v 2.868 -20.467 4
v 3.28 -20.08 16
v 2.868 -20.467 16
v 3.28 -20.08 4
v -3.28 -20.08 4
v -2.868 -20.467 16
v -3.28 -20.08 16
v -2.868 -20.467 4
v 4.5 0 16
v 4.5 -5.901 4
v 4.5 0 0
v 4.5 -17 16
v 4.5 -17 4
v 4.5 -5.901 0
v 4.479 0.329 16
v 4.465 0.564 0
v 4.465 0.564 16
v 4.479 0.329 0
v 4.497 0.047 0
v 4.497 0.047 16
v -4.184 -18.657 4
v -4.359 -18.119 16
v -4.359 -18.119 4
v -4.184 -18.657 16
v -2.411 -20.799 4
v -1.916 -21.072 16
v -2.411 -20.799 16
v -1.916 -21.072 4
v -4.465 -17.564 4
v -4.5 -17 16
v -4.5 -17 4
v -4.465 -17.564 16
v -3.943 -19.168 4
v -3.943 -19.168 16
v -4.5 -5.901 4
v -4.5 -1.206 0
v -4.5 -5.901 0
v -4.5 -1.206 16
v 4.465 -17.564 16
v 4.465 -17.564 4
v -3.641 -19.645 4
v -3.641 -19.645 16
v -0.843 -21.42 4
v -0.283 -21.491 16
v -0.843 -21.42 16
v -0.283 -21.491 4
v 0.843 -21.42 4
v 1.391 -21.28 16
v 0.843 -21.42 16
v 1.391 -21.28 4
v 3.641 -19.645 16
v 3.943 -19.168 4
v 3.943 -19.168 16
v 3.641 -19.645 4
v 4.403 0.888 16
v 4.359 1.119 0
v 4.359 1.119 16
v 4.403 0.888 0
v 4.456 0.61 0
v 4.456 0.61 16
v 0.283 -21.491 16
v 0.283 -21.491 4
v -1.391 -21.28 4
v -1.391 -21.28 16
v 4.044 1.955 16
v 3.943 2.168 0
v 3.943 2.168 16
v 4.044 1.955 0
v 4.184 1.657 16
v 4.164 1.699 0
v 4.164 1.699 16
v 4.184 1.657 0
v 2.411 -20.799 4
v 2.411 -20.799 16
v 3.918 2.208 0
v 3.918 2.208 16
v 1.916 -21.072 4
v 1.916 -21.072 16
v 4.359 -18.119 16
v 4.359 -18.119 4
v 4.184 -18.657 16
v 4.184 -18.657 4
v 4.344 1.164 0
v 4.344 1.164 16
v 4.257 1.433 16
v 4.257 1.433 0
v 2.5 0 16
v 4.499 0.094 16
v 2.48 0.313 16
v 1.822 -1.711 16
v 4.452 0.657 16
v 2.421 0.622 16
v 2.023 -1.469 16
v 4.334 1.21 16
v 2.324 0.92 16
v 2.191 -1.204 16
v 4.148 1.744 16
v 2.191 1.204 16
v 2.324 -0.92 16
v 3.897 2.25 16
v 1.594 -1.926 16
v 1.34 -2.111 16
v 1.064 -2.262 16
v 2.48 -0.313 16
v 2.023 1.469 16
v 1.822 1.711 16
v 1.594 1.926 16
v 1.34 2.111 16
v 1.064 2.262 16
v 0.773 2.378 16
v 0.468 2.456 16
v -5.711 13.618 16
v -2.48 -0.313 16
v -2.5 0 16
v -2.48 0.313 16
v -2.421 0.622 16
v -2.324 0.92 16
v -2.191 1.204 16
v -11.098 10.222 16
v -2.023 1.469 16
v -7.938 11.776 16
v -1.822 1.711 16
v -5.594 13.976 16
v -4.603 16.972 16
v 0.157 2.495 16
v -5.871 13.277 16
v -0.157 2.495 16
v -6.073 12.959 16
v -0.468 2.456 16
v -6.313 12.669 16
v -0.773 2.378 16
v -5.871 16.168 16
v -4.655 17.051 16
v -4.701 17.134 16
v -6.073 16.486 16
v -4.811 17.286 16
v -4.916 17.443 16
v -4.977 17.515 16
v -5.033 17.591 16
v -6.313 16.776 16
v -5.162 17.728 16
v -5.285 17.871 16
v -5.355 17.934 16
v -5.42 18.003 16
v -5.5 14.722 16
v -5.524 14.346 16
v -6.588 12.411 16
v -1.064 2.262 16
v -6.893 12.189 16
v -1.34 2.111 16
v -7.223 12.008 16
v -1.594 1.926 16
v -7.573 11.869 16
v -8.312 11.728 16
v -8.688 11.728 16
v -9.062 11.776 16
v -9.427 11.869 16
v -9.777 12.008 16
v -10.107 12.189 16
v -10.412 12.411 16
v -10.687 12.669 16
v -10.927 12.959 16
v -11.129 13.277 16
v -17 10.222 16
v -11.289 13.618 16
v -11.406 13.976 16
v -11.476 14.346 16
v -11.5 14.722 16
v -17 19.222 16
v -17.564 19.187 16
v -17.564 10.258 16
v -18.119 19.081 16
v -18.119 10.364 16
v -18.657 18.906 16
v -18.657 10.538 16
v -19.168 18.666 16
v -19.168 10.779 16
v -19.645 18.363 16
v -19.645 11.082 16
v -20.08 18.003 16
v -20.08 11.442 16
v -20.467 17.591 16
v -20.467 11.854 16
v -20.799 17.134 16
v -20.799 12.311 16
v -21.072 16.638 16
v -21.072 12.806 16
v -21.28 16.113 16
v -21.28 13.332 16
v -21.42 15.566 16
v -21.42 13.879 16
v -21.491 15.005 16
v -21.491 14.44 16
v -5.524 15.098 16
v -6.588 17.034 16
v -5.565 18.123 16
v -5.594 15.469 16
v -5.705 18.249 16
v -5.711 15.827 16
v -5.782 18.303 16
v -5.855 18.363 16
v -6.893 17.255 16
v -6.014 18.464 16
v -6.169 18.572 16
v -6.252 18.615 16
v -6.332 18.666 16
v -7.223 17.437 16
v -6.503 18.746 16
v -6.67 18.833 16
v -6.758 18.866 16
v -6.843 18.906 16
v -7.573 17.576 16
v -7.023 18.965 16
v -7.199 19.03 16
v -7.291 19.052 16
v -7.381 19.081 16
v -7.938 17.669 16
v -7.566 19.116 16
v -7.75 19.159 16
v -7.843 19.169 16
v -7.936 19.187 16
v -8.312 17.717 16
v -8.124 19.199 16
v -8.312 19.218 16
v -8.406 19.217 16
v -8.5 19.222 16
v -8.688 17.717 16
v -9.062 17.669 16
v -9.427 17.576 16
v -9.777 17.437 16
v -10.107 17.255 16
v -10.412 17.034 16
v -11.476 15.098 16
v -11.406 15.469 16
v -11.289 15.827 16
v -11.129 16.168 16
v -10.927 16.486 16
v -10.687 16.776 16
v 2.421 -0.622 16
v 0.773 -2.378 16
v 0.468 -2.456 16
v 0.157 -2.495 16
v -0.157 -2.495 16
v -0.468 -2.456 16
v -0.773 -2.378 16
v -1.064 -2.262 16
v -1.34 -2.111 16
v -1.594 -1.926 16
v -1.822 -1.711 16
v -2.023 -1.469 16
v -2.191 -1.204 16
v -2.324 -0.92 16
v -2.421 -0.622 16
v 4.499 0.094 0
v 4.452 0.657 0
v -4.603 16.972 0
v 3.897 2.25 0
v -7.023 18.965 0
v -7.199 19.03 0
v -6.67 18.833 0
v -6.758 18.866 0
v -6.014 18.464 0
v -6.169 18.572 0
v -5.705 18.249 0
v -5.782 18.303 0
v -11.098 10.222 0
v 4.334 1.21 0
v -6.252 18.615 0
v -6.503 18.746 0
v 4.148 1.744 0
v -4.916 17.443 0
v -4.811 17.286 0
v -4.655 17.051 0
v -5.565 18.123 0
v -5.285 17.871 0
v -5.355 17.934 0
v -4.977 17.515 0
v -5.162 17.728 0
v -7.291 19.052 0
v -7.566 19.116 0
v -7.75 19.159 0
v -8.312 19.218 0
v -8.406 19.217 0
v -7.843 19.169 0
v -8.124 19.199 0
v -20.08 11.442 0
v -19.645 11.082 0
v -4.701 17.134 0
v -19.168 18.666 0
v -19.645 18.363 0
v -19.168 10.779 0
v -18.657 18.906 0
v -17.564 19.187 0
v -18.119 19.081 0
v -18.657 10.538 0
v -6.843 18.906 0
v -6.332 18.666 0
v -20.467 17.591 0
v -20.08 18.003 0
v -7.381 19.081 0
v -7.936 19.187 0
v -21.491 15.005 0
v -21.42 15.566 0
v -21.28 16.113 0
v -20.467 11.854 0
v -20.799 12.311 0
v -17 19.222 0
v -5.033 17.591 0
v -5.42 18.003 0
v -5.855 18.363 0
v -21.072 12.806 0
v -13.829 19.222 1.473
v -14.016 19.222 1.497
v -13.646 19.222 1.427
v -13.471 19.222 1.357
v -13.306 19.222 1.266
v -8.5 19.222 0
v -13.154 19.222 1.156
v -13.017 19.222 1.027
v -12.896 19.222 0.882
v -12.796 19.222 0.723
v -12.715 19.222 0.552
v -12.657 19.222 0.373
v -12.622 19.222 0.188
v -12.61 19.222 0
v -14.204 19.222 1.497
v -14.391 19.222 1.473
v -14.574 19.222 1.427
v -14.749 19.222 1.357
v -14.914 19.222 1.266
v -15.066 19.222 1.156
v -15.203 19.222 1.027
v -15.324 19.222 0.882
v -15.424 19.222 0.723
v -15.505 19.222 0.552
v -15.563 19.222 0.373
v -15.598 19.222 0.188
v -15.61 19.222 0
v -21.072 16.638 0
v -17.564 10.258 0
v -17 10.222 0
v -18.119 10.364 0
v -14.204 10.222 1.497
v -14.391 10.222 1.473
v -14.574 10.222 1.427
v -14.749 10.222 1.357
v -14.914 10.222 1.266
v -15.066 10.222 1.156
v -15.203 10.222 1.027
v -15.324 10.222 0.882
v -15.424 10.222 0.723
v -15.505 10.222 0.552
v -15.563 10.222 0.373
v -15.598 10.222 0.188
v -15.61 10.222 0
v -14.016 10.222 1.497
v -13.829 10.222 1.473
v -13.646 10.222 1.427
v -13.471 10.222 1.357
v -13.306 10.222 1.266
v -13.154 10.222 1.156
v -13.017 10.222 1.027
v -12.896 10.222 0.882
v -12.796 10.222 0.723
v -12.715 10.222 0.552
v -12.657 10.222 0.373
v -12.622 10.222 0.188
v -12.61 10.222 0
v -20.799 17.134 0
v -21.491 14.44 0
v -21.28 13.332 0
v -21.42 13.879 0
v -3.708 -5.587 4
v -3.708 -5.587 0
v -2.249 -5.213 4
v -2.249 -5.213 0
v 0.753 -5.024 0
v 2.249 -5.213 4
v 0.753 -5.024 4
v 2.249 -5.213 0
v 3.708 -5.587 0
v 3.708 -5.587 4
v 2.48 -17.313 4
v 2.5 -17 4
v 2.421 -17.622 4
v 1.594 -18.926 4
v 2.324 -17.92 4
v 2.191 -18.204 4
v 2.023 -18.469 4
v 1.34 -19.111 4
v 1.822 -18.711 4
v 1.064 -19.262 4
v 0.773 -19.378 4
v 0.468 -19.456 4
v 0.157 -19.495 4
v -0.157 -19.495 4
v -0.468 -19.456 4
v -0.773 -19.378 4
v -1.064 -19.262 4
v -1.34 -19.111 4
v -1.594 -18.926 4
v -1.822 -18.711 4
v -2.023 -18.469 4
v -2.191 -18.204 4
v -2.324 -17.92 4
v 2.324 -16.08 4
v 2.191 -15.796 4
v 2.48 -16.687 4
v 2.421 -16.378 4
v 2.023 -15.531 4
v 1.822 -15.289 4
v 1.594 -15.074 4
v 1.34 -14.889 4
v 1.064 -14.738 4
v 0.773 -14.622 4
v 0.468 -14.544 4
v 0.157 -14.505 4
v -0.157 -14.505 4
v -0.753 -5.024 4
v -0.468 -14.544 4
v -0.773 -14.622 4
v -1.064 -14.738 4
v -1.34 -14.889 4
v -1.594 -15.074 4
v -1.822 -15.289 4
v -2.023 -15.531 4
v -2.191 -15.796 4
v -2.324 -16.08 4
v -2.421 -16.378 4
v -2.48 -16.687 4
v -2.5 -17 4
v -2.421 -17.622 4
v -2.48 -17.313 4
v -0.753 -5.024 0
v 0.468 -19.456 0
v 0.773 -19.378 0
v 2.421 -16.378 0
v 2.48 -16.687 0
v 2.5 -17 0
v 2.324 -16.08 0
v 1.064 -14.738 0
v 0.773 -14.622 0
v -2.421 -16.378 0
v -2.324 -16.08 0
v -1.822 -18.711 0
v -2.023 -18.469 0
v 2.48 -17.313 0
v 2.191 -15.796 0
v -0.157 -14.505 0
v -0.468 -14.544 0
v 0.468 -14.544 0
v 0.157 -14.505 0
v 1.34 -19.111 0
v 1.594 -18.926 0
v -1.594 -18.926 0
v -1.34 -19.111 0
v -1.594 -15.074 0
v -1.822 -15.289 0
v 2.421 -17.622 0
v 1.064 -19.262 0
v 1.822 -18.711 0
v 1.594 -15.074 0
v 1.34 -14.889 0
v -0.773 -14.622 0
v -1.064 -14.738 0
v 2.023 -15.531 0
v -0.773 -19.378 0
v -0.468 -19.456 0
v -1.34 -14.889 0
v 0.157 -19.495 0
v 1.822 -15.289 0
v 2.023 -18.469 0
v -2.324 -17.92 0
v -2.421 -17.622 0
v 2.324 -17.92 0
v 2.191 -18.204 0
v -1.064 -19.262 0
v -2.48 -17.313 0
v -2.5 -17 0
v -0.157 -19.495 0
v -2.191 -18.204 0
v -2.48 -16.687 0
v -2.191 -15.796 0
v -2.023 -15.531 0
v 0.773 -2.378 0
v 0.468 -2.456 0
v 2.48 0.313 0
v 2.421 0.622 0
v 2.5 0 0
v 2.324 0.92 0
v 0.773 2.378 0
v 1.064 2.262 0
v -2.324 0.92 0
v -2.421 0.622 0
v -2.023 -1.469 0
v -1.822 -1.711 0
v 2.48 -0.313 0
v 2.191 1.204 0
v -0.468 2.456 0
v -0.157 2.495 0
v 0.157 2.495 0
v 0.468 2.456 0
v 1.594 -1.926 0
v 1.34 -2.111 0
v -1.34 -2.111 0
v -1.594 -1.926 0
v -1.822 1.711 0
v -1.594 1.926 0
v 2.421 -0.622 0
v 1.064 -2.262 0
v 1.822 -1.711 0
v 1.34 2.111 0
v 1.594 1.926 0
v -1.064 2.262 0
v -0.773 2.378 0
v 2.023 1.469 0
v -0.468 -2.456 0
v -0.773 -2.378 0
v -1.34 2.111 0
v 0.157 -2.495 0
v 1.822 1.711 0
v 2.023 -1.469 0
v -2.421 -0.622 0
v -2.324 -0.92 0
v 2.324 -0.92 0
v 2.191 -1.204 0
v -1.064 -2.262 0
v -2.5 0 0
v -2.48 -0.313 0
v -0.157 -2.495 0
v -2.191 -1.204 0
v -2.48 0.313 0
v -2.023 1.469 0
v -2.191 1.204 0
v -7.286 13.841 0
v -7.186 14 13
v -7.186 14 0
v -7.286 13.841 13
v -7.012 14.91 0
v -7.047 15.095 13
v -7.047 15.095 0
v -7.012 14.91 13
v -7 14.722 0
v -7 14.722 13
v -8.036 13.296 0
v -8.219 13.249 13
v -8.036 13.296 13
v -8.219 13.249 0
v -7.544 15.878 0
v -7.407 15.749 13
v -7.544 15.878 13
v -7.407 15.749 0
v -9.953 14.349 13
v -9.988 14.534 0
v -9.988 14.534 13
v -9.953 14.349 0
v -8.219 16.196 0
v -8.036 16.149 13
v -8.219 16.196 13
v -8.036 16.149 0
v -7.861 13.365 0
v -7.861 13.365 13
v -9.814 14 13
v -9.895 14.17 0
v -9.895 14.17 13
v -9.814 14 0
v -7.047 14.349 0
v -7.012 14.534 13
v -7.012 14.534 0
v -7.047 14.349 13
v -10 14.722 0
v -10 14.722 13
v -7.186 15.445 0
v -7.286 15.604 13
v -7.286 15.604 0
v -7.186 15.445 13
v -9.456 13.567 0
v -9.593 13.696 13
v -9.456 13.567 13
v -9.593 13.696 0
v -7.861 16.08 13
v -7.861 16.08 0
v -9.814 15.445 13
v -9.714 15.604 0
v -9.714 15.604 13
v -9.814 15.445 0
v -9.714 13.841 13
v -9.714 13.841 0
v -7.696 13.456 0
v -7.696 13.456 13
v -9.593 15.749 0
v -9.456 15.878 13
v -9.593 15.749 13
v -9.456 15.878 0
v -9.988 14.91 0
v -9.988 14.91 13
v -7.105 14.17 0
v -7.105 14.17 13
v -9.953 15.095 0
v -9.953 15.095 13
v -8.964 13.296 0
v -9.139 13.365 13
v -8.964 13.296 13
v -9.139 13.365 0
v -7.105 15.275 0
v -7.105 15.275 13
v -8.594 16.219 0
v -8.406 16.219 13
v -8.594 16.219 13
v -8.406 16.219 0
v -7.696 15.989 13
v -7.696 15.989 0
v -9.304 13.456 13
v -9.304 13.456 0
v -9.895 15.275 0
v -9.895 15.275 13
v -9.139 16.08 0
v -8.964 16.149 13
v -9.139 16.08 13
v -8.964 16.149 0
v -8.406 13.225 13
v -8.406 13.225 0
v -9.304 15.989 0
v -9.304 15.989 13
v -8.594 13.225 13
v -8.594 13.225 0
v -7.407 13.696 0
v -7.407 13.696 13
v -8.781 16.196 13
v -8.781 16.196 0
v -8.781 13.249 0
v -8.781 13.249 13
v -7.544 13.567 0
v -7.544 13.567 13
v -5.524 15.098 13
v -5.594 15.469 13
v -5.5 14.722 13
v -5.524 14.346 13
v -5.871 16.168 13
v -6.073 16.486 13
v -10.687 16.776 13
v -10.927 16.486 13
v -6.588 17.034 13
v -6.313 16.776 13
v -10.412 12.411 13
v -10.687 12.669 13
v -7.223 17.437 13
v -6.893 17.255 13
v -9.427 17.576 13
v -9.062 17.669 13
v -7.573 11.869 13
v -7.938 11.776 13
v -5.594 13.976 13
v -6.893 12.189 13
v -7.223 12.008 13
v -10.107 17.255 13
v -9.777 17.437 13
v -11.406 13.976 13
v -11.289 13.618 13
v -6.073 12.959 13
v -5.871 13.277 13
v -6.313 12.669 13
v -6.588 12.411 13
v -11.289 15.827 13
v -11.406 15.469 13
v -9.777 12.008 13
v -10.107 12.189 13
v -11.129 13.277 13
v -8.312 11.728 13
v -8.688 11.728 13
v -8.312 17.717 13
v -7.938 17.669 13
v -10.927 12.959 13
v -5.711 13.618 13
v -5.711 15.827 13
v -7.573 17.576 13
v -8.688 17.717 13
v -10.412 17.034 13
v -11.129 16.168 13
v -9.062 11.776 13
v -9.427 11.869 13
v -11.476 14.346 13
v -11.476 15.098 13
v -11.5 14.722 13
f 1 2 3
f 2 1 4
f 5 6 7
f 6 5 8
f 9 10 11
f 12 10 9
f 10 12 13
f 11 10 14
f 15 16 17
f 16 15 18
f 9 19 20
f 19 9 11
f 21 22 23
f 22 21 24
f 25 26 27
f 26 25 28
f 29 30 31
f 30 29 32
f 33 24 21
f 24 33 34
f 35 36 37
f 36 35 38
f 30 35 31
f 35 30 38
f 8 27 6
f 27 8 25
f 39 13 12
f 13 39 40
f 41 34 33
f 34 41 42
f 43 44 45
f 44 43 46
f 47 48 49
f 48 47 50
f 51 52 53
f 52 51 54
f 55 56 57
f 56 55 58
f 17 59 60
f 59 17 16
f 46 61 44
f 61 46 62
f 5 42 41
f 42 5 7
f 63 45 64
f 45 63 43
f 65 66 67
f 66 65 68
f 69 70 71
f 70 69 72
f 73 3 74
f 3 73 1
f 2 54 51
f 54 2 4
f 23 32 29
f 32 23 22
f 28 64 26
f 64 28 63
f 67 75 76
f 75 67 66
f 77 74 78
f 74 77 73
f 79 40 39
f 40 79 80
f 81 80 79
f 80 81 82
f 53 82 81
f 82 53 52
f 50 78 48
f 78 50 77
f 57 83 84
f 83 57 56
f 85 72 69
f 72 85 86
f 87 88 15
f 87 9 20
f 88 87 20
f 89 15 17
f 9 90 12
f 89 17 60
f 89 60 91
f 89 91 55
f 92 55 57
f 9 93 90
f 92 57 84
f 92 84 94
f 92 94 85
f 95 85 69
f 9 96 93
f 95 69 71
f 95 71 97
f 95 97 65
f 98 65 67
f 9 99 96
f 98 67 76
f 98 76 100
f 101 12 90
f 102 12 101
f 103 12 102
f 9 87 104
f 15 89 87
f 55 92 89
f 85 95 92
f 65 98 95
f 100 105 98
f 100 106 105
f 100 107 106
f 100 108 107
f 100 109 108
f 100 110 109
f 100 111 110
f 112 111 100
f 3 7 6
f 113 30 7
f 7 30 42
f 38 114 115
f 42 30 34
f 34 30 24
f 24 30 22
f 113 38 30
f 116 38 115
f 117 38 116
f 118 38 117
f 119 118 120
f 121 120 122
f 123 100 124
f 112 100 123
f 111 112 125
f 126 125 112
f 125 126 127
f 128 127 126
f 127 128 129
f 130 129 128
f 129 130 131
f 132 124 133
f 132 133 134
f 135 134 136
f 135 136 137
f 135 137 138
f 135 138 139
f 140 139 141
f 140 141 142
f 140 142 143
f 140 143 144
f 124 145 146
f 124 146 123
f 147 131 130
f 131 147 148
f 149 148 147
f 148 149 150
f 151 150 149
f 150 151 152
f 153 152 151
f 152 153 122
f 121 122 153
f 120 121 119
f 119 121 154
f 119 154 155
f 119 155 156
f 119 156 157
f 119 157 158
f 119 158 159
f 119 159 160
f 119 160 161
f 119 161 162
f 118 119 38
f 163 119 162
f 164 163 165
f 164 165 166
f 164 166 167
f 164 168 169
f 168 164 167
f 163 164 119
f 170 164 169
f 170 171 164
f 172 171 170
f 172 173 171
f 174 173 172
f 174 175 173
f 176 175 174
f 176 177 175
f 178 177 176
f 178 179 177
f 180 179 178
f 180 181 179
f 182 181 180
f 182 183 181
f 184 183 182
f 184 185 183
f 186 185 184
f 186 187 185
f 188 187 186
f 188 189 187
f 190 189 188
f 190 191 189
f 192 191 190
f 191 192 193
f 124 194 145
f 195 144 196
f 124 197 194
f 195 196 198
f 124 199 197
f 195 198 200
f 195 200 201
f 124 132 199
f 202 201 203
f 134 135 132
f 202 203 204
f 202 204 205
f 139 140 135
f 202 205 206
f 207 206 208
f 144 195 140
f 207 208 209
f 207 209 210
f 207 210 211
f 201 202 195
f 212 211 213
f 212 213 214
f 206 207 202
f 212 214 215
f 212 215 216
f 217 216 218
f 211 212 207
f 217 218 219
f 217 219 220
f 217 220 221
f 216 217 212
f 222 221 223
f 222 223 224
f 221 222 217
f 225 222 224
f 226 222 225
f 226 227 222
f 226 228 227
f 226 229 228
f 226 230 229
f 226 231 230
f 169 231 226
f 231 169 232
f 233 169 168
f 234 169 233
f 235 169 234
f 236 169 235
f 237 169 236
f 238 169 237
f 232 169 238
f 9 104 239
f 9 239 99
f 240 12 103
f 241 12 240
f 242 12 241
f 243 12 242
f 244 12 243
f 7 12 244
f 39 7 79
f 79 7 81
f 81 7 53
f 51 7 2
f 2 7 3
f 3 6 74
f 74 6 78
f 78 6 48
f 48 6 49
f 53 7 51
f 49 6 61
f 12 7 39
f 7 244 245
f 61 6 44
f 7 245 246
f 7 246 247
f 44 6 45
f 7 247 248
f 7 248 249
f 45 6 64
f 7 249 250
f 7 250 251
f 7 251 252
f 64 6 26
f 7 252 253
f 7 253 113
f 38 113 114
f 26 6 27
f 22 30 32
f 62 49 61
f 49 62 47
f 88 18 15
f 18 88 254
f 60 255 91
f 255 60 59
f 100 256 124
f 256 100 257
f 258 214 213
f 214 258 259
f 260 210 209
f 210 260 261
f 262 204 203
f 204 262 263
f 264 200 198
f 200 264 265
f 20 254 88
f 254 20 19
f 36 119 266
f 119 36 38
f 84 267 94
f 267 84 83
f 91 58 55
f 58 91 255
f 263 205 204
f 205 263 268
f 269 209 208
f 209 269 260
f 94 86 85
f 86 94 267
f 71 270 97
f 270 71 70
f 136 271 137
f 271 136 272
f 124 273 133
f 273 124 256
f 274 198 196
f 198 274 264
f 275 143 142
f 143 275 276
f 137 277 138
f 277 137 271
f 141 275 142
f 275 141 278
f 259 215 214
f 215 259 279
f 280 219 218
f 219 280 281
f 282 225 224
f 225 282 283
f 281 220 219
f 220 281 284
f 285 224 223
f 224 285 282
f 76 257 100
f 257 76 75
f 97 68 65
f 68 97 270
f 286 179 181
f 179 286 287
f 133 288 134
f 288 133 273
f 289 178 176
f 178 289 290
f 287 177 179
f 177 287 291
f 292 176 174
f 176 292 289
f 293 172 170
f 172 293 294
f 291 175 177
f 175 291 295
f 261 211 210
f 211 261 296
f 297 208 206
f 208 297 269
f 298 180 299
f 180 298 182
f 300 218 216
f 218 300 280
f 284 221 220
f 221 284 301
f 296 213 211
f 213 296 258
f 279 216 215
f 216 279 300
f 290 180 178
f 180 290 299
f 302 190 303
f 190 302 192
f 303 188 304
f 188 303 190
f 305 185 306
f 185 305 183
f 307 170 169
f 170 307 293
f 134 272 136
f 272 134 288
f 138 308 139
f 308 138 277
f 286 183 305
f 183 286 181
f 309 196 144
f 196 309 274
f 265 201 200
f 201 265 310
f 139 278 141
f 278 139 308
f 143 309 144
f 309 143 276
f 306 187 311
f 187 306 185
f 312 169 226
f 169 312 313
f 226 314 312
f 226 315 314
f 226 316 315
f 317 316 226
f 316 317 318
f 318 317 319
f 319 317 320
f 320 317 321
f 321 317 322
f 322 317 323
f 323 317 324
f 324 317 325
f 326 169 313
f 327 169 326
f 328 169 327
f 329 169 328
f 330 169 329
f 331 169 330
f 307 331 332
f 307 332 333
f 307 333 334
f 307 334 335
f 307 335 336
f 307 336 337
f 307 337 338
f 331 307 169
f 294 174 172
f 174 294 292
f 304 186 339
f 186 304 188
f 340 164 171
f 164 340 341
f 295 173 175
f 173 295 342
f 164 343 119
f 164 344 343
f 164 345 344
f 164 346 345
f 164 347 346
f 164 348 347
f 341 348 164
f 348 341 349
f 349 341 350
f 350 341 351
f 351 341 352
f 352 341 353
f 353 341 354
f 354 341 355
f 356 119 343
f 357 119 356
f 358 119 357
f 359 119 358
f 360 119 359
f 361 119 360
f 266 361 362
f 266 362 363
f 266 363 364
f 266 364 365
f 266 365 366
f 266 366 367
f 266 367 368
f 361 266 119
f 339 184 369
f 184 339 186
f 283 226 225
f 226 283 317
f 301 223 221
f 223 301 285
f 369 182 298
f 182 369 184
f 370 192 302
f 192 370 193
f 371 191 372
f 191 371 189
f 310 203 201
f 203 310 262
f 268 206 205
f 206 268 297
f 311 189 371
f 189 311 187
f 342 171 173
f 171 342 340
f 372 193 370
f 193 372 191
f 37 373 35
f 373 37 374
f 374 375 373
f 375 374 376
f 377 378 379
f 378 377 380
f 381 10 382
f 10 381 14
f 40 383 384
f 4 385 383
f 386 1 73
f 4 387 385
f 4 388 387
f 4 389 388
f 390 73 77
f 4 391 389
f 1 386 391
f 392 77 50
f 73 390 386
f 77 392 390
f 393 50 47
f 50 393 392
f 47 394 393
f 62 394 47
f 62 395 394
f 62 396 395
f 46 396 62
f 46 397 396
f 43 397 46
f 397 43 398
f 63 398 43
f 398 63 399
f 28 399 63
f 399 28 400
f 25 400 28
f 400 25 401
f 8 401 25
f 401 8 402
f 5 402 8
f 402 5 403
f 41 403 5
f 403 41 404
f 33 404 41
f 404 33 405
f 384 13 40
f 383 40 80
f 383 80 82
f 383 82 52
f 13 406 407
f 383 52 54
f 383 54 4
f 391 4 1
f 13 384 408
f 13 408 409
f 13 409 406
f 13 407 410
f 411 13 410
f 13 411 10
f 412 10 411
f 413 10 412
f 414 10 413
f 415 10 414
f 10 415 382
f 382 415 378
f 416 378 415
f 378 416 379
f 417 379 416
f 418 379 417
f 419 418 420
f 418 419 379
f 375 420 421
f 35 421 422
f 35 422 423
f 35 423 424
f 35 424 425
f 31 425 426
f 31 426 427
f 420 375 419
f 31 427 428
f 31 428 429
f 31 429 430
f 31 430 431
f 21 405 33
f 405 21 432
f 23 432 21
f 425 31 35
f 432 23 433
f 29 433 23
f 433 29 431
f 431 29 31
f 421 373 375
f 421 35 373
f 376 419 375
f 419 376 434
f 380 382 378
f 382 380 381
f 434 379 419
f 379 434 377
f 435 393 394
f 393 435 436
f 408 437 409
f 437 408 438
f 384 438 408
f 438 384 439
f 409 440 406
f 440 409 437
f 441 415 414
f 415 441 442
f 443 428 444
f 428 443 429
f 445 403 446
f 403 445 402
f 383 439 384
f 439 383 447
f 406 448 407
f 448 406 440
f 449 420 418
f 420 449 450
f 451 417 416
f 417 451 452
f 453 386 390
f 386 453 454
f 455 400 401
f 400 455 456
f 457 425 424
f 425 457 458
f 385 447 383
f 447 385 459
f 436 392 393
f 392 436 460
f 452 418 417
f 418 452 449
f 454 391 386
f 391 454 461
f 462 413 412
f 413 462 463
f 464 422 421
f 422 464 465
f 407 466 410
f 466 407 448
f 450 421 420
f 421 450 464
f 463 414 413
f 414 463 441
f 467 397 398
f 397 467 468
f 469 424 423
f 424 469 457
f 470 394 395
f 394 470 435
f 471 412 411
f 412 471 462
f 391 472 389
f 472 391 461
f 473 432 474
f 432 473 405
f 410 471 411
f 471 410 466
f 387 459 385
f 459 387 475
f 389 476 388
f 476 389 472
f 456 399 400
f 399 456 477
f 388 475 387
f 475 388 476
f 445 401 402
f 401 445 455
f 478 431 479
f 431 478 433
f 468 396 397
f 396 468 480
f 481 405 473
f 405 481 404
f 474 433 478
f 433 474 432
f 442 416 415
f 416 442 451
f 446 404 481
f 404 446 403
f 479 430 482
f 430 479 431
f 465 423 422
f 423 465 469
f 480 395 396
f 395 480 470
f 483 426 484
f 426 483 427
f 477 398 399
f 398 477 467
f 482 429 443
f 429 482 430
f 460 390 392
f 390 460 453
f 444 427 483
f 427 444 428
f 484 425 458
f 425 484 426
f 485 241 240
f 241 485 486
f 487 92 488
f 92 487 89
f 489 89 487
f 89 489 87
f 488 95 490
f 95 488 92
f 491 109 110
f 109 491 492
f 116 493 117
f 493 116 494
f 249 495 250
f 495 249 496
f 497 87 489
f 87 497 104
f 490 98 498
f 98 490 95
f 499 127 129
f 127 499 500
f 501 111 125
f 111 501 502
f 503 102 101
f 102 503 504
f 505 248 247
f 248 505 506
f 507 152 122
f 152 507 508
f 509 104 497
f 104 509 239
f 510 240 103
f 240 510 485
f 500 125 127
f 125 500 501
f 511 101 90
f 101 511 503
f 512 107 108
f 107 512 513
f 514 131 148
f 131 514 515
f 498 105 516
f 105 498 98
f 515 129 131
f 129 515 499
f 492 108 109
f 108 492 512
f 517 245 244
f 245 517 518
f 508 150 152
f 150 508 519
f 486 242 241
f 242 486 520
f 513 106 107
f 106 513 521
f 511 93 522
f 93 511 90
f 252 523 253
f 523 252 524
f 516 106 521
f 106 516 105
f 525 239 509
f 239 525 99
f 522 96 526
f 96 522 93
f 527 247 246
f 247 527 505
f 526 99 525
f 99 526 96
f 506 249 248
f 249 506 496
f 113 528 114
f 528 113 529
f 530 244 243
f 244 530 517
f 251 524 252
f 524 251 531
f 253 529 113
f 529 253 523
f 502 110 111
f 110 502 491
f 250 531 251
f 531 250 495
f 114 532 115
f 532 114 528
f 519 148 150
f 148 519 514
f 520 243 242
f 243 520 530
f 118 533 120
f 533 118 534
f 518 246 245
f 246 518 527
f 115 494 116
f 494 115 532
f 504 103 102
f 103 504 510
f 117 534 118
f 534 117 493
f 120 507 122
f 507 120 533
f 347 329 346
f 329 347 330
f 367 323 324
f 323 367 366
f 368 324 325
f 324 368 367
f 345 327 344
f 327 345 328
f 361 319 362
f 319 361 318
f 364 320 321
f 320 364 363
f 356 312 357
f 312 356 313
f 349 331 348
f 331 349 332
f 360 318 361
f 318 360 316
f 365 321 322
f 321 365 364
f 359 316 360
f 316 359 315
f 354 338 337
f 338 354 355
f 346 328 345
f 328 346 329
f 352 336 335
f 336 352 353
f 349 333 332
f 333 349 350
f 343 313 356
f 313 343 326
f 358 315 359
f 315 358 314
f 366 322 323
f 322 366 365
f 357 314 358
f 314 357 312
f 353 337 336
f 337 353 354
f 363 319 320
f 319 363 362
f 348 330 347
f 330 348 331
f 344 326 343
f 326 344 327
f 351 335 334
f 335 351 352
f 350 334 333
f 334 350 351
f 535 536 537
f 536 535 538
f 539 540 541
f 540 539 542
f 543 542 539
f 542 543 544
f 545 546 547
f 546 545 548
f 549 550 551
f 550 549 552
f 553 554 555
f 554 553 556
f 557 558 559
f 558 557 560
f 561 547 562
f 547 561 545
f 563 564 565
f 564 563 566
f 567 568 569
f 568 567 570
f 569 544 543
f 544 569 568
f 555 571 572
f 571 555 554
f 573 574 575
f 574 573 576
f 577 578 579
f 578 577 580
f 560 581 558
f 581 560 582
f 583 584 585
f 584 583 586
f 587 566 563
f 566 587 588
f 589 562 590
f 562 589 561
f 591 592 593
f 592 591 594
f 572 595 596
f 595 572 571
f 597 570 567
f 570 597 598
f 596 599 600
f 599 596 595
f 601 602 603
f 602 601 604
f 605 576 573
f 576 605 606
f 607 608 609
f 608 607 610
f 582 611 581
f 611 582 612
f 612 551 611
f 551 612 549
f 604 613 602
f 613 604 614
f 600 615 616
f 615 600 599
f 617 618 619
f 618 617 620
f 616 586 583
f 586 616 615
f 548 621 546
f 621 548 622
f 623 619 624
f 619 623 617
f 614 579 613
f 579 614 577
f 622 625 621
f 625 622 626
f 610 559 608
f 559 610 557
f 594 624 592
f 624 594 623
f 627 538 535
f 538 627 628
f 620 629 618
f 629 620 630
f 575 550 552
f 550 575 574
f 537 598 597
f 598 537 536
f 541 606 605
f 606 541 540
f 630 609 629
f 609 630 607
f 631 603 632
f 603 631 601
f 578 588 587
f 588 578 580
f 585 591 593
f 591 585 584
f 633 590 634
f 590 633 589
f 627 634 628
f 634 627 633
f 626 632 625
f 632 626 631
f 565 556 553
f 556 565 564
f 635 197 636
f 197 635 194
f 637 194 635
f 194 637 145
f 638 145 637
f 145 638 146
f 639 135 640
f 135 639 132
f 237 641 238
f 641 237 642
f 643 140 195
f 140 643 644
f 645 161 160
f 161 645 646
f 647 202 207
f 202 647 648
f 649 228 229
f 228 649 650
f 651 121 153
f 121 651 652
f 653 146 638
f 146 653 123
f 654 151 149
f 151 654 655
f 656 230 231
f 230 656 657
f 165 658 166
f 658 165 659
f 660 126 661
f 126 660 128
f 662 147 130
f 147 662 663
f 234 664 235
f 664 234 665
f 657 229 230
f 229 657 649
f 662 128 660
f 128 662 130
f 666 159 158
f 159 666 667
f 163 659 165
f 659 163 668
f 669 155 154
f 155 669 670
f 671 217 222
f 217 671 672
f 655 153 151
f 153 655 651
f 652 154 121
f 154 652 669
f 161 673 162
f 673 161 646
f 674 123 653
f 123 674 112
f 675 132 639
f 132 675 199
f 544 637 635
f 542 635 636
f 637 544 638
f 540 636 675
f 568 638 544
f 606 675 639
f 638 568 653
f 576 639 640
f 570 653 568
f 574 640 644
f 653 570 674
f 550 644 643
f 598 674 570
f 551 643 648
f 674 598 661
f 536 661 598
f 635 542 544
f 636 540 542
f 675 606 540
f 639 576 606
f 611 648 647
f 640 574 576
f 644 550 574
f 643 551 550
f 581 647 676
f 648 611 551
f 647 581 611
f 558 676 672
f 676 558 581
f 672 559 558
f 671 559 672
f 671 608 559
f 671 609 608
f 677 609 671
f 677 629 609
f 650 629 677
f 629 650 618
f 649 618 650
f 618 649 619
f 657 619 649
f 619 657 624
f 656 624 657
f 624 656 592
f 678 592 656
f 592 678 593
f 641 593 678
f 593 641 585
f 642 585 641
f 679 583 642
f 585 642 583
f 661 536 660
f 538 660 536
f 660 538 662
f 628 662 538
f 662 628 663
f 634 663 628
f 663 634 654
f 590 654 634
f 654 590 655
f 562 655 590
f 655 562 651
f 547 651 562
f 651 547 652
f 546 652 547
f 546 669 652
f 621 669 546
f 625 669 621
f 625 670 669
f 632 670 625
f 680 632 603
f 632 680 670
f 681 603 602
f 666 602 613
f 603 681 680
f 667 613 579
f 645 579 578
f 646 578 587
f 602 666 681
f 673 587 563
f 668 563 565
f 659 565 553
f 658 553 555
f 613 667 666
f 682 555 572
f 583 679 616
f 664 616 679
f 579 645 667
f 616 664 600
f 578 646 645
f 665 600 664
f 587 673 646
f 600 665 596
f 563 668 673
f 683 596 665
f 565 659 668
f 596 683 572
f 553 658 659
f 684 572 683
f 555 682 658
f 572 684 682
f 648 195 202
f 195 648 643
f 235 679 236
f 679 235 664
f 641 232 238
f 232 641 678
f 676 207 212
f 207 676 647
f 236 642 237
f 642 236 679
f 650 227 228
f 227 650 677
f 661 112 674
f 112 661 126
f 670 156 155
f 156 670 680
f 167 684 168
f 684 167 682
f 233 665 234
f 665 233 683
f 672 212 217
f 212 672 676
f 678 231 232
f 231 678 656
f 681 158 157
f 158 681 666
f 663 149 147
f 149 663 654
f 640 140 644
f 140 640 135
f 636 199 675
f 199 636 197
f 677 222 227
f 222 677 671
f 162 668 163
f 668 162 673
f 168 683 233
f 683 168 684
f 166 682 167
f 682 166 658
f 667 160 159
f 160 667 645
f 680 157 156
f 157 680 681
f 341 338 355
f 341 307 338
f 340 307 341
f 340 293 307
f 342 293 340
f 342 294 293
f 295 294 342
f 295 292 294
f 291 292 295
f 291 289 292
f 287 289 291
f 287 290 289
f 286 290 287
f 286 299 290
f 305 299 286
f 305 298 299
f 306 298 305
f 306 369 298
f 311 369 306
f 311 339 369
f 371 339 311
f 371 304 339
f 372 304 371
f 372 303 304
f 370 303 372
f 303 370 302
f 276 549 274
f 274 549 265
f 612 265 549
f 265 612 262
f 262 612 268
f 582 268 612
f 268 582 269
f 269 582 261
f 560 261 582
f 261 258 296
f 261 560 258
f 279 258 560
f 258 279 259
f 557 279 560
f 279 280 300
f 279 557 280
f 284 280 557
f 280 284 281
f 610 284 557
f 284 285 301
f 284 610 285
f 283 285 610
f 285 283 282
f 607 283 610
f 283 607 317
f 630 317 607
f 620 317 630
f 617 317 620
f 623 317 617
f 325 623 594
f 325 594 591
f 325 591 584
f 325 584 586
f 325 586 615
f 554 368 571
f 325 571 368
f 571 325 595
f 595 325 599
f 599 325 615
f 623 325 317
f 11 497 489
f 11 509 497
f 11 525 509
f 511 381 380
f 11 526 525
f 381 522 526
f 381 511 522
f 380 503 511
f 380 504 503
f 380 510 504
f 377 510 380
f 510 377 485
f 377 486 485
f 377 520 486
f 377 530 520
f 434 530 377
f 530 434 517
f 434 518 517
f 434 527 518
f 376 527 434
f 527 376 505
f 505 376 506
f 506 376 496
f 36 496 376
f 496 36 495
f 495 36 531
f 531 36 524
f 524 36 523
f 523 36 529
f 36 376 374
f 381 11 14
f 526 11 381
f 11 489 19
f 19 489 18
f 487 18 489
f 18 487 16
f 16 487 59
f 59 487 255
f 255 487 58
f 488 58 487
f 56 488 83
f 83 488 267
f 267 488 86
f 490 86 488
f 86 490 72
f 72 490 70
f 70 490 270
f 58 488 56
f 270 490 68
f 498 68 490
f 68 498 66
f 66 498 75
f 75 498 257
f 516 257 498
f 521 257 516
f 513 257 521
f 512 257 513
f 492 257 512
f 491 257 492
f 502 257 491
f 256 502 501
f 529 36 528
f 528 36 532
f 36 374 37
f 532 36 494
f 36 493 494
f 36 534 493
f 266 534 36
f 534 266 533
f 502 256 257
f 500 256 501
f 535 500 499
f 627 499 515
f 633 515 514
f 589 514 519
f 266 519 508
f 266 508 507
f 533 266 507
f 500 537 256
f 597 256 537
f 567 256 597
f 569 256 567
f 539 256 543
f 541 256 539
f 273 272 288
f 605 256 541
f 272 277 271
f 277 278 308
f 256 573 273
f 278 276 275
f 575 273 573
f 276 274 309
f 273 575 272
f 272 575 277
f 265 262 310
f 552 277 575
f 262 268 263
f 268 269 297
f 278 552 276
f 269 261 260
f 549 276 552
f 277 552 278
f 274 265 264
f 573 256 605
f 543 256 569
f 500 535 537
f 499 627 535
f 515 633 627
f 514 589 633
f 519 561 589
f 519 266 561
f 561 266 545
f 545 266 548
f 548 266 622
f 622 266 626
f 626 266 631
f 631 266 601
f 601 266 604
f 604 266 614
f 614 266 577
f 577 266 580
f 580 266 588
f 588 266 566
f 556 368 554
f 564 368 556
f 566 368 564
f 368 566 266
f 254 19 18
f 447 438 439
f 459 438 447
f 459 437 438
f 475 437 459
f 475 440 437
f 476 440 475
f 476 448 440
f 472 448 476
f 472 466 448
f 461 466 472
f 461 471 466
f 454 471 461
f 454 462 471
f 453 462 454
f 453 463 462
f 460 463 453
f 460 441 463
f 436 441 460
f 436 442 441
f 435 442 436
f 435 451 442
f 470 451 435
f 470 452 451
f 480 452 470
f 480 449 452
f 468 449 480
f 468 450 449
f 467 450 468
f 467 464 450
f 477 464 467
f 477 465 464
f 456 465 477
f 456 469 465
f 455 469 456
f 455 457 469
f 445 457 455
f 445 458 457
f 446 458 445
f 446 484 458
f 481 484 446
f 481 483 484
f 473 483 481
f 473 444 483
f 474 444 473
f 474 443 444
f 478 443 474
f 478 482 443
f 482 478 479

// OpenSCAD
WHEEL_INNER_DIA = 5;
WHEEL_OUTER_DIA = 24;
WHEEL_THICKNESS = 8; // 1 mm thicker than the actual wheel to accomodate washers.

PULLEY_SHAFT_LEN = 12; 
PULLEY_SHAFT_DIA = 10;

SEGMENT_DIA = PULLEY_SHAFT_DIA - 1; // 1 mm slimmer to accomodate washers.
SEGMENT_WIDTH = 2 * PULLEY_SHAFT_LEN + WHEEL_THICKNESS;
SEGMENT_LENGTH = (WHEEL_OUTER_DIA + PULLEY_SHAFT_DIA)/2;
SEGMENT_MOUNT_DIA = 3;
SEGMENT_MOUNT_HEAD_DIA = 6;
SEGMENT_ANGLE = 30;

$fn = 50;

module wheel_neg() {
    difference() {
        cylinder(d = WHEEL_OUTER_DIA, h = WHEEL_THICKNESS, center = true);
        cylinder(d = WHEEL_INNER_DIA, h = WHEEL_THICKNESS, center = true);
    }
}

module segment_pos(length) {
    hull() {
        for(i = [-1, 1]) {
            translate([0, i * length/2, 0])
            cylinder(d = SEGMENT_DIA, h = SEGMENT_WIDTH, center = true);
        }
    }
}

module mounting_hole_neg(dia) {
    cylinder(d = dia, h = SEGMENT_WIDTH, center = true);
}

intersection() {
    difference() {
        union() {
            translate([0, -SEGMENT_LENGTH/2, 0])
            segment_pos(SEGMENT_LENGTH);

            rotate([0, 0, SEGMENT_ANGLE])
            translate([0, SEGMENT_LENGTH/2, 0])
            segment_pos(SEGMENT_LENGTH);
            
            translate([-sin(SEGMENT_ANGLE) * SEGMENT_LENGTH - SEGMENT_LENGTH/4, cos(SEGMENT_ANGLE) * SEGMENT_LENGTH, 0])
            rotate([0, 0, 90])
            segment_pos(SEGMENT_LENGTH/2);
        }
        // Wheel cutout
        translate([0, -SEGMENT_LENGTH, 0])
        wheel_neg();

        // Main shaft
        mounting_hole_neg(WHEEL_INNER_DIA);

        // Tensioner hole
        translate([-sin(SEGMENT_ANGLE) * SEGMENT_LENGTH - SEGMENT_LENGTH/2 * 0.66, cos(SEGMENT_ANGLE) * SEGMENT_LENGTH, 0])
        rotate([90, 0, 0])
        mounting_hole_neg(SEGMENT_MOUNT_DIA);

        // The thing that holds this together
        translate([-sin(SEGMENT_ANGLE) * SEGMENT_LENGTH, cos(SEGMENT_ANGLE)*SEGMENT_LENGTH, 0])
        mounting_hole_neg(SEGMENT_MOUNT_DIA);
        
        translate([-sin(SEGMENT_ANGLE) * SEGMENT_LENGTH, cos(SEGMENT_ANGLE)*SEGMENT_LENGTH, SEGMENT_WIDTH - SEGMENT_MOUNT_HEAD_DIA/2])
        mounting_hole_neg(SEGMENT_MOUNT_HEAD_DIA);
        
        translate([-sin(SEGMENT_ANGLE) * SEGMENT_LENGTH, cos(SEGMENT_ANGLE)*SEGMENT_LENGTH, -SEGMENT_WIDTH + SEGMENT_MOUNT_HEAD_DIA/2])
        mounting_hole_neg(SEGMENT_MOUNT_HEAD_DIA);
        
    }
    
    cylinder(d = SEGMENT_LENGTH*4, h = SEGMENT_WIDTH);
}
